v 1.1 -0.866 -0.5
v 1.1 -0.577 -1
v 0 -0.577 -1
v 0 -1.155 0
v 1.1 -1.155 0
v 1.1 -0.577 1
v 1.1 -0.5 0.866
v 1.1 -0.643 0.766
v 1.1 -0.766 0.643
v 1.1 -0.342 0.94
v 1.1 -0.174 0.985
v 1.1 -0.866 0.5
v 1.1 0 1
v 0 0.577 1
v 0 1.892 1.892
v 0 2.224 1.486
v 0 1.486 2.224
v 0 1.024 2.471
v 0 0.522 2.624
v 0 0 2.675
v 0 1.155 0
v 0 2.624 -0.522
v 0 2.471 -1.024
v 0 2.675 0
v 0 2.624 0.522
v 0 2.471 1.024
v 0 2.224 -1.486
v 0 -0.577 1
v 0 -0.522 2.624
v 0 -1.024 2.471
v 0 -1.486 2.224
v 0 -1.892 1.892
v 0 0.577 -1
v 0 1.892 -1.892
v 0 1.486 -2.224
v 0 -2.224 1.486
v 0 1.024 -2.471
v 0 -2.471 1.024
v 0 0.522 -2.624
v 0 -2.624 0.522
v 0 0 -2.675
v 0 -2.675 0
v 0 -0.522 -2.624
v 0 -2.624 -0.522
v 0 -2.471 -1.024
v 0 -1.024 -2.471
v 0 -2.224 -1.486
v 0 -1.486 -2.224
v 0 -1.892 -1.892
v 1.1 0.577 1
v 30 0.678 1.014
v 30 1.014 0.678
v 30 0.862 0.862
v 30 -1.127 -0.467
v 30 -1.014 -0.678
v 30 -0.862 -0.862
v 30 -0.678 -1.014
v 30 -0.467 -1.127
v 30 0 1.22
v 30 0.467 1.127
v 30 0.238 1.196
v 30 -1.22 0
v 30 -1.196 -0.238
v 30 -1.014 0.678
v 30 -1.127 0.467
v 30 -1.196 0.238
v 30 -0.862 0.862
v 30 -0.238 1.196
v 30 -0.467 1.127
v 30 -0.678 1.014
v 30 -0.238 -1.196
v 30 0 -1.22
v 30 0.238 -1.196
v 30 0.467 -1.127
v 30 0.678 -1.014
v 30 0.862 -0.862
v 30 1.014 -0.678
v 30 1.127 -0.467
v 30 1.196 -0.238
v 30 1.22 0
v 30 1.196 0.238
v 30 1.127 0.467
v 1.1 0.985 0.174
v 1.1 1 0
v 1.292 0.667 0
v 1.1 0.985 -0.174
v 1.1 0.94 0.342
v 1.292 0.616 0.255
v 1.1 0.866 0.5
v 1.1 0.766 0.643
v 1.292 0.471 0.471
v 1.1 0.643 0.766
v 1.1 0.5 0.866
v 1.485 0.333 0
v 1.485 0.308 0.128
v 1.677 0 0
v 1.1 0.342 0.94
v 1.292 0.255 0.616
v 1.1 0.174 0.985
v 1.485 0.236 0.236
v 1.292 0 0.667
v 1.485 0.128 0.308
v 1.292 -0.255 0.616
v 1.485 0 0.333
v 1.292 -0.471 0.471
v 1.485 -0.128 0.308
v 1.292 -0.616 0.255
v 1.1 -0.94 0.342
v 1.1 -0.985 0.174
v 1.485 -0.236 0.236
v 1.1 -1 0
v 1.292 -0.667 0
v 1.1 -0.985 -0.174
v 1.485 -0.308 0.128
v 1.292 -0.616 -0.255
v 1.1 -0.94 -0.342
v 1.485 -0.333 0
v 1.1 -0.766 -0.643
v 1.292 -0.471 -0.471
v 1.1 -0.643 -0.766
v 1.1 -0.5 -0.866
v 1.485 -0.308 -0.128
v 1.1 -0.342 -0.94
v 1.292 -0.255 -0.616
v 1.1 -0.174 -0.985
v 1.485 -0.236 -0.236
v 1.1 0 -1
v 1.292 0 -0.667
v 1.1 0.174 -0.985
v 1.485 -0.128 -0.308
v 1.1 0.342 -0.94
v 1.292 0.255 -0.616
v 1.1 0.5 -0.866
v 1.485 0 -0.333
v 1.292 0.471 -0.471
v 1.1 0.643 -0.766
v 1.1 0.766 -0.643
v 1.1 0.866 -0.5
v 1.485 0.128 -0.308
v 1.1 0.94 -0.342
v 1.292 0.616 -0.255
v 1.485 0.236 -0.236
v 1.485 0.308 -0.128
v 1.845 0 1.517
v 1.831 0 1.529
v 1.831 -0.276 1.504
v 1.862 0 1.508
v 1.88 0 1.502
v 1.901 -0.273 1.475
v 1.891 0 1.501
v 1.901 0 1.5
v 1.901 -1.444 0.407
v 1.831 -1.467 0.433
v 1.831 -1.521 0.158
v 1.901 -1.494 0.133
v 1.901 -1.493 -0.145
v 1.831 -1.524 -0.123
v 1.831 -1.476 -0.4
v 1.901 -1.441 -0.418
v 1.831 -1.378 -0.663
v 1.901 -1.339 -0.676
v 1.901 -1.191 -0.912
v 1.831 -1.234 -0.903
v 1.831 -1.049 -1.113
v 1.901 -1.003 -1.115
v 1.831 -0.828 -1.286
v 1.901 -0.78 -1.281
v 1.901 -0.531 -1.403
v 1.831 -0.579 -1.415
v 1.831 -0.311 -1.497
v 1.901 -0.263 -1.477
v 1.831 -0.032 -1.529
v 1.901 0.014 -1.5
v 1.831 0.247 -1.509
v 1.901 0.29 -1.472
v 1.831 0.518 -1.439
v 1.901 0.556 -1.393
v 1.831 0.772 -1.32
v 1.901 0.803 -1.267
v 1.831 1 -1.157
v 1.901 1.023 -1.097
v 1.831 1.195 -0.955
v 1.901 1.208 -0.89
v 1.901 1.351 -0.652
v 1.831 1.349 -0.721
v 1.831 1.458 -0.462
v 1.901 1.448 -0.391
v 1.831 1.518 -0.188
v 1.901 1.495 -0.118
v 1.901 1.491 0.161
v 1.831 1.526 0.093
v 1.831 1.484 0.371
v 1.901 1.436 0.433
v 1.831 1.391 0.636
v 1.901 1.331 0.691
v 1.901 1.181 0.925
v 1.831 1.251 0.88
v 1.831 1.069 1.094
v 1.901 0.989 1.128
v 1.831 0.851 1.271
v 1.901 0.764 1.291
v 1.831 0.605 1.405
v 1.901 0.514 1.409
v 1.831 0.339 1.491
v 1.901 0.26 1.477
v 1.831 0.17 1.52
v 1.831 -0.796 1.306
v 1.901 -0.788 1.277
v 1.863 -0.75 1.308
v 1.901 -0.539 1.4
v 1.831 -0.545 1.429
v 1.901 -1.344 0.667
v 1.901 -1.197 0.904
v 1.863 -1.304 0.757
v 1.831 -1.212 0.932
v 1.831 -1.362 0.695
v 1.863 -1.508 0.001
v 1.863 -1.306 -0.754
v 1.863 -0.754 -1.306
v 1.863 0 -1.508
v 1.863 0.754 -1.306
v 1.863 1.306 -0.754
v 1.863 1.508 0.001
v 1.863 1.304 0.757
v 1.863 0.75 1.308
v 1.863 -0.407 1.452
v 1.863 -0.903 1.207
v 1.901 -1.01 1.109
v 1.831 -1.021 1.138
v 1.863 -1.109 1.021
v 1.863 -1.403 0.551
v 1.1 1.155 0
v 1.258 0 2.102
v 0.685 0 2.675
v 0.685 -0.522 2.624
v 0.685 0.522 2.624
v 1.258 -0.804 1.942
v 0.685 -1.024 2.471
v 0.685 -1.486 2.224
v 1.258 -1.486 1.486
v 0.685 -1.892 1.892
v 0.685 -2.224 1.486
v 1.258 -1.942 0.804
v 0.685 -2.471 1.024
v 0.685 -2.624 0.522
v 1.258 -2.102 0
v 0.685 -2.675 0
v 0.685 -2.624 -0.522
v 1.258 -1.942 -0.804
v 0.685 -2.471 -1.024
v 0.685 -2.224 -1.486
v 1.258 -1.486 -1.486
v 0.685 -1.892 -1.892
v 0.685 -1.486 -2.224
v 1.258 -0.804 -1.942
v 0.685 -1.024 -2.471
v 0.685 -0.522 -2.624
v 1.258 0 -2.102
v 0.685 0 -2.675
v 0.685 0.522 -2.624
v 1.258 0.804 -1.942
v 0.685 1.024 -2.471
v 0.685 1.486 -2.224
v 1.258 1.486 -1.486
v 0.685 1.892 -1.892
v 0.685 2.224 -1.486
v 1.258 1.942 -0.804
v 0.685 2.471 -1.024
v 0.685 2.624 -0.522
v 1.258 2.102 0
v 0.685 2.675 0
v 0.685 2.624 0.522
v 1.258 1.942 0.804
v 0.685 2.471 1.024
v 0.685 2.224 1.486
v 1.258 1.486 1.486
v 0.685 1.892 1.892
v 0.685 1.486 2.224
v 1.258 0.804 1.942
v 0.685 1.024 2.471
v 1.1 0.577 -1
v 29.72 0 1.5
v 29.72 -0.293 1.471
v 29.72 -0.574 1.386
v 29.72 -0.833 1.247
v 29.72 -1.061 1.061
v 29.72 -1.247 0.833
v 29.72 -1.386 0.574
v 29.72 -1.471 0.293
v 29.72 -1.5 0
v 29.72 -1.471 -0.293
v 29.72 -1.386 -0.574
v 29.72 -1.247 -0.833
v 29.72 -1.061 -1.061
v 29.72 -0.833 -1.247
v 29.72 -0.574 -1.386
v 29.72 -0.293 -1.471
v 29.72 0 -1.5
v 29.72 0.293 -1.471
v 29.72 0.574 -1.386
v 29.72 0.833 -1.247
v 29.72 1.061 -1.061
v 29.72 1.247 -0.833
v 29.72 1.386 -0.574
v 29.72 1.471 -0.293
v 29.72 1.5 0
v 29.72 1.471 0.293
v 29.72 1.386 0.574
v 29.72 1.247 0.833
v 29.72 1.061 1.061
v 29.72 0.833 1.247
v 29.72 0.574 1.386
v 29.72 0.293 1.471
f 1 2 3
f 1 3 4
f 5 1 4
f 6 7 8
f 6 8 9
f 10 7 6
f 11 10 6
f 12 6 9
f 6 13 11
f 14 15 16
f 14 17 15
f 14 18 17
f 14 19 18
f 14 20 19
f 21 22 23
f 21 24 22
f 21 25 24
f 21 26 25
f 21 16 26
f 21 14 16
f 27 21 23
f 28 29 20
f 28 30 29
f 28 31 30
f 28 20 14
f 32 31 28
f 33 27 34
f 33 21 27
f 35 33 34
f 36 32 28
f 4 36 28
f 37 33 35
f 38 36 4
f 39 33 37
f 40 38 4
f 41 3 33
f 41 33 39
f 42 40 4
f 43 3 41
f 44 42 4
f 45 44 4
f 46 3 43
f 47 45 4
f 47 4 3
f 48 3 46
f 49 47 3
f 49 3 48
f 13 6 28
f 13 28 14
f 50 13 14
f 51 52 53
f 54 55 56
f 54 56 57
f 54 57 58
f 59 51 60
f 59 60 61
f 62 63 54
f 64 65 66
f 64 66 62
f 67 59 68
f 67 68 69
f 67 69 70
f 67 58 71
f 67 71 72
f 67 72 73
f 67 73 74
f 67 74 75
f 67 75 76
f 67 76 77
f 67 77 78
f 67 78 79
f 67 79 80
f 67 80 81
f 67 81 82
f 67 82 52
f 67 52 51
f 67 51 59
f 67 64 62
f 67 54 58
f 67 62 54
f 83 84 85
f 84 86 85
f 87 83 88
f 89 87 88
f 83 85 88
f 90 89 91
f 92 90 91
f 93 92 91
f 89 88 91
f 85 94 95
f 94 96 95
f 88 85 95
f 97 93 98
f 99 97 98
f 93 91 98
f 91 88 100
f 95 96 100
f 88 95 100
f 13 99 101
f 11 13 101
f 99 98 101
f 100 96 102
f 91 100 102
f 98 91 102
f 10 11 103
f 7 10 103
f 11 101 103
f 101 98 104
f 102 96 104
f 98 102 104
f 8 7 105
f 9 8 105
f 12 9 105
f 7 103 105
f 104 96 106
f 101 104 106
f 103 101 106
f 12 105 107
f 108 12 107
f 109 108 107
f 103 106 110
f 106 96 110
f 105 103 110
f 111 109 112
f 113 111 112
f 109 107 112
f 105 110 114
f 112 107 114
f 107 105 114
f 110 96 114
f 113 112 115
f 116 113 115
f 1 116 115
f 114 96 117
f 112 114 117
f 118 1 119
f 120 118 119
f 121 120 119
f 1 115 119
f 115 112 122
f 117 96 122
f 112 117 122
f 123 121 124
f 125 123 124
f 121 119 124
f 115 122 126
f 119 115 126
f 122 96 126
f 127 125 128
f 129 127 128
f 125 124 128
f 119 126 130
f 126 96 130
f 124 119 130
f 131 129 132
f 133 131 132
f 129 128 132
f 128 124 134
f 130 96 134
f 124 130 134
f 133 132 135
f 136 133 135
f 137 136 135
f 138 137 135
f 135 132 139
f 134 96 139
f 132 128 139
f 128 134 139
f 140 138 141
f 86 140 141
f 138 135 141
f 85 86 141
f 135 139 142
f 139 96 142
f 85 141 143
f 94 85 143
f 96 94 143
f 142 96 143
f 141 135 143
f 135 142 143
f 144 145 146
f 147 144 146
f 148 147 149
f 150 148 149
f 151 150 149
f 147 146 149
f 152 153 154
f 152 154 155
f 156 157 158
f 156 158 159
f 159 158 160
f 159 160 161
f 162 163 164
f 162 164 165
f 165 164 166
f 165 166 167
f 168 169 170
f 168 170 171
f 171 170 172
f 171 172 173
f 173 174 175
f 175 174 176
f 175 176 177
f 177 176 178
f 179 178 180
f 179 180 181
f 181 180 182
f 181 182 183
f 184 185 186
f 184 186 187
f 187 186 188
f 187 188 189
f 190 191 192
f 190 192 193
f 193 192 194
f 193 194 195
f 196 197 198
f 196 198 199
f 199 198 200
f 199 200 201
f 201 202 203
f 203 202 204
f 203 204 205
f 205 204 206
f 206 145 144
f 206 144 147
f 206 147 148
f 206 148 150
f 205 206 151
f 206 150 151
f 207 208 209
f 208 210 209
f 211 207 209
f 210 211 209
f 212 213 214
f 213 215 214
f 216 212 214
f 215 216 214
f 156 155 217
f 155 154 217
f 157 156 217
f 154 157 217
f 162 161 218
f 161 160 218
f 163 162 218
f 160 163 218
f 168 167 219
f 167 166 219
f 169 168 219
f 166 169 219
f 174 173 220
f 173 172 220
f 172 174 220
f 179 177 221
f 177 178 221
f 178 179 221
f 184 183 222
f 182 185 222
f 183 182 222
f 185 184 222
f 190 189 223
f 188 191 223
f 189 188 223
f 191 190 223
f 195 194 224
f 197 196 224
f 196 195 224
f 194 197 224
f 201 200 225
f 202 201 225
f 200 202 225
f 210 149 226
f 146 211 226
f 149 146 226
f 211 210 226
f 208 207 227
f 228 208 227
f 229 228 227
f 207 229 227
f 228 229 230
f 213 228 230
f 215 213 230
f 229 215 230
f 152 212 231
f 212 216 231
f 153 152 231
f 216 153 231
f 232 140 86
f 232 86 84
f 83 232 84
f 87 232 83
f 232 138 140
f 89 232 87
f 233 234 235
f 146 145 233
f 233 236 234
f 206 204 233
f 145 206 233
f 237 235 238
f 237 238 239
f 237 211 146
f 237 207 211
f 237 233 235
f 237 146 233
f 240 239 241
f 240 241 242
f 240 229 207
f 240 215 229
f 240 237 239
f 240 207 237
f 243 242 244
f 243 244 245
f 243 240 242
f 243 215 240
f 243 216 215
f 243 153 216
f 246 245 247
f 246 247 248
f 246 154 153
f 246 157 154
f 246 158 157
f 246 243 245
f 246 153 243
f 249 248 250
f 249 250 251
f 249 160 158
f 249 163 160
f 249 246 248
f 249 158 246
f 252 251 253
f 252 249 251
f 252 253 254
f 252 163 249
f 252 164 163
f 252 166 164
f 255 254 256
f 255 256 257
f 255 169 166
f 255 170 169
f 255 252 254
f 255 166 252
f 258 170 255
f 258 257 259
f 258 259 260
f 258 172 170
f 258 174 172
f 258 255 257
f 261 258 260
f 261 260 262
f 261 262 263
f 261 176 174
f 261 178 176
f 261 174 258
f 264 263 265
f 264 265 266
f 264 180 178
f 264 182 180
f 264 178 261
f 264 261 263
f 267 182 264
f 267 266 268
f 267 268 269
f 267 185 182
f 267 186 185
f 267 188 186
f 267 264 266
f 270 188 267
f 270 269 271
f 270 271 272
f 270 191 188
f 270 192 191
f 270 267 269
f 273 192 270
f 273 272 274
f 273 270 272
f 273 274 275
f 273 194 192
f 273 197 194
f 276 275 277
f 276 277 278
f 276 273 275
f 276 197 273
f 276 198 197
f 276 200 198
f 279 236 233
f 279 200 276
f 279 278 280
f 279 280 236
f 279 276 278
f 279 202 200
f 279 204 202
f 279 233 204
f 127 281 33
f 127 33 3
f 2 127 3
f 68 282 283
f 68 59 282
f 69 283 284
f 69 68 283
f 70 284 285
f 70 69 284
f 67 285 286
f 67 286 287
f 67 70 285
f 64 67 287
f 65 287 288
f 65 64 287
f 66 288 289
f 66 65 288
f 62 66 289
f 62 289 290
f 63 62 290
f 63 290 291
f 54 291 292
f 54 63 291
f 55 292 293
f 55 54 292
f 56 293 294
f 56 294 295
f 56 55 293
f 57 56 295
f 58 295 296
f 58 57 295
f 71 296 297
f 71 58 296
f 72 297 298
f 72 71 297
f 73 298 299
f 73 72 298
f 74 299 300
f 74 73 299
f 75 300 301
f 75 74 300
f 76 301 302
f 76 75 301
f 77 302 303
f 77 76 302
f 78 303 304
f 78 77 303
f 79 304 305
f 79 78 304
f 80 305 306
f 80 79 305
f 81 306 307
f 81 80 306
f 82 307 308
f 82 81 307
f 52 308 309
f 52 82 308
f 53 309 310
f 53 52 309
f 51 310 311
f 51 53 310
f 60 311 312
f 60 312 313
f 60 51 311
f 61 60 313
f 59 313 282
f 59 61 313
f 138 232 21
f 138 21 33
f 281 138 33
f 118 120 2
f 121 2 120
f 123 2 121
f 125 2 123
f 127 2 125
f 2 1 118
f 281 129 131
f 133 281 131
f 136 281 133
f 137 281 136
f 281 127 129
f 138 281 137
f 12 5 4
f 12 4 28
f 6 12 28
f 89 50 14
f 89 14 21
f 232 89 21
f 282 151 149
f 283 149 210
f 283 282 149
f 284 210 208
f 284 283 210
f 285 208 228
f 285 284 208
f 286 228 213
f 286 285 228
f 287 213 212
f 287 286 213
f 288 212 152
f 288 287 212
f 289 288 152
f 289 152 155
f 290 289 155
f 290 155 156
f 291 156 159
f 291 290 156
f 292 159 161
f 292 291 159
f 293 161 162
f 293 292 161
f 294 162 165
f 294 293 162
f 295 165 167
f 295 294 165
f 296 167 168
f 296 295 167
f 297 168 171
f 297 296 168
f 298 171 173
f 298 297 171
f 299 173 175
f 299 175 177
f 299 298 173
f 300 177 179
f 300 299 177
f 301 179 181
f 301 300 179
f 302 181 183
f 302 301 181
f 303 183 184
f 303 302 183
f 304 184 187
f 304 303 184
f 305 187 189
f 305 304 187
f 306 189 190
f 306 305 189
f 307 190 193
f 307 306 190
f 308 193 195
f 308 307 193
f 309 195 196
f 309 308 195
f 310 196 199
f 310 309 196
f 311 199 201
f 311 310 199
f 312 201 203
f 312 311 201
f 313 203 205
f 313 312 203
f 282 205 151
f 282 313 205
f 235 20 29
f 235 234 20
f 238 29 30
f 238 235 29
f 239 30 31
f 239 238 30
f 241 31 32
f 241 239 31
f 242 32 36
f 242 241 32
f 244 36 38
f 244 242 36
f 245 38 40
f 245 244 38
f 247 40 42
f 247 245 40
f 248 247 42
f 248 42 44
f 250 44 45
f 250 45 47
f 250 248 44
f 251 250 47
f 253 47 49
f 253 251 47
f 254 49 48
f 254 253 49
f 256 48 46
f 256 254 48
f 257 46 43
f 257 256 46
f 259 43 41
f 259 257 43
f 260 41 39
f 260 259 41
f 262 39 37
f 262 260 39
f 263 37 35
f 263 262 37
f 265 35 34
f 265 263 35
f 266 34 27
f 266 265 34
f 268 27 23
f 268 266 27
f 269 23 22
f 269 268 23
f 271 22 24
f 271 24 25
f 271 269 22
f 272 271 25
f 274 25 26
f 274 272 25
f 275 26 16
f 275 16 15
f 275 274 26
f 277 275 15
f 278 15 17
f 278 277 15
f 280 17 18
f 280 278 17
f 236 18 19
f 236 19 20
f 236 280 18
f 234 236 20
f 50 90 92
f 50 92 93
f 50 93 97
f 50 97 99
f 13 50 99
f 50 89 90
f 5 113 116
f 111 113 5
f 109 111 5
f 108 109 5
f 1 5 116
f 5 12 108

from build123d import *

# Parameters (mm, degrees)
FILLET1_R   = 0.1
HEX_START   = -1.1
HEX_2_DEPTH = 1.1


with BuildPart() as part:
    # BodySke → BaseBody (revolve)
    with BuildSketch(Plane.XY, mode=Mode.PRIVATE) as basebody_sk:
        Polygon((0, 0), (0, 2.675), (0.685, 2.675), (1.86, 1.5), (29.7195, 1.5), (30, 1.2195), (30, 0), align=None)
    revolve(basebody_sk.sketch.rotate(Axis((0, 0, 0), (1, 0, 0)), 90), axis=Axis((0, 0, 0), (1, 0, 0)))

    # Fillet1
    fillet1_edges = [part.edges().sort_by_distance(p)[0] for p in [
        (1.86, 0, -1.5),
    ]]
    fillet(fillet1_edges, radius=FILLET1_R)

    # Hex 2: read off the stored shape, not the designer's step
    # Hex 2 outline → Hex 2 (cut)
    with BuildSketch(Plane.ZY.offset(HEX_START)):
        Polygon((-1, -0.577350269), (0, -1.154700538), (1, -0.577350269), (1, 0.577350269), (0, 1.154700538), (-1, 0.577350269), align=None)
    extrude(amount=HEX_2_DEPTH, mode=Mode.SUBTRACT)

    # Hex 2 2 outline → Hex 2 2 (revolve, cut)
    with BuildSketch(Plane.YX):
        Polygon((1, 1.1), (0, 1.677350269), (0, 1.1), align=None)
    revolve(axis=Axis((0, 0, 0), (1, 0, 0)), mode=Mode.SUBTRACT)


solid = part.part
